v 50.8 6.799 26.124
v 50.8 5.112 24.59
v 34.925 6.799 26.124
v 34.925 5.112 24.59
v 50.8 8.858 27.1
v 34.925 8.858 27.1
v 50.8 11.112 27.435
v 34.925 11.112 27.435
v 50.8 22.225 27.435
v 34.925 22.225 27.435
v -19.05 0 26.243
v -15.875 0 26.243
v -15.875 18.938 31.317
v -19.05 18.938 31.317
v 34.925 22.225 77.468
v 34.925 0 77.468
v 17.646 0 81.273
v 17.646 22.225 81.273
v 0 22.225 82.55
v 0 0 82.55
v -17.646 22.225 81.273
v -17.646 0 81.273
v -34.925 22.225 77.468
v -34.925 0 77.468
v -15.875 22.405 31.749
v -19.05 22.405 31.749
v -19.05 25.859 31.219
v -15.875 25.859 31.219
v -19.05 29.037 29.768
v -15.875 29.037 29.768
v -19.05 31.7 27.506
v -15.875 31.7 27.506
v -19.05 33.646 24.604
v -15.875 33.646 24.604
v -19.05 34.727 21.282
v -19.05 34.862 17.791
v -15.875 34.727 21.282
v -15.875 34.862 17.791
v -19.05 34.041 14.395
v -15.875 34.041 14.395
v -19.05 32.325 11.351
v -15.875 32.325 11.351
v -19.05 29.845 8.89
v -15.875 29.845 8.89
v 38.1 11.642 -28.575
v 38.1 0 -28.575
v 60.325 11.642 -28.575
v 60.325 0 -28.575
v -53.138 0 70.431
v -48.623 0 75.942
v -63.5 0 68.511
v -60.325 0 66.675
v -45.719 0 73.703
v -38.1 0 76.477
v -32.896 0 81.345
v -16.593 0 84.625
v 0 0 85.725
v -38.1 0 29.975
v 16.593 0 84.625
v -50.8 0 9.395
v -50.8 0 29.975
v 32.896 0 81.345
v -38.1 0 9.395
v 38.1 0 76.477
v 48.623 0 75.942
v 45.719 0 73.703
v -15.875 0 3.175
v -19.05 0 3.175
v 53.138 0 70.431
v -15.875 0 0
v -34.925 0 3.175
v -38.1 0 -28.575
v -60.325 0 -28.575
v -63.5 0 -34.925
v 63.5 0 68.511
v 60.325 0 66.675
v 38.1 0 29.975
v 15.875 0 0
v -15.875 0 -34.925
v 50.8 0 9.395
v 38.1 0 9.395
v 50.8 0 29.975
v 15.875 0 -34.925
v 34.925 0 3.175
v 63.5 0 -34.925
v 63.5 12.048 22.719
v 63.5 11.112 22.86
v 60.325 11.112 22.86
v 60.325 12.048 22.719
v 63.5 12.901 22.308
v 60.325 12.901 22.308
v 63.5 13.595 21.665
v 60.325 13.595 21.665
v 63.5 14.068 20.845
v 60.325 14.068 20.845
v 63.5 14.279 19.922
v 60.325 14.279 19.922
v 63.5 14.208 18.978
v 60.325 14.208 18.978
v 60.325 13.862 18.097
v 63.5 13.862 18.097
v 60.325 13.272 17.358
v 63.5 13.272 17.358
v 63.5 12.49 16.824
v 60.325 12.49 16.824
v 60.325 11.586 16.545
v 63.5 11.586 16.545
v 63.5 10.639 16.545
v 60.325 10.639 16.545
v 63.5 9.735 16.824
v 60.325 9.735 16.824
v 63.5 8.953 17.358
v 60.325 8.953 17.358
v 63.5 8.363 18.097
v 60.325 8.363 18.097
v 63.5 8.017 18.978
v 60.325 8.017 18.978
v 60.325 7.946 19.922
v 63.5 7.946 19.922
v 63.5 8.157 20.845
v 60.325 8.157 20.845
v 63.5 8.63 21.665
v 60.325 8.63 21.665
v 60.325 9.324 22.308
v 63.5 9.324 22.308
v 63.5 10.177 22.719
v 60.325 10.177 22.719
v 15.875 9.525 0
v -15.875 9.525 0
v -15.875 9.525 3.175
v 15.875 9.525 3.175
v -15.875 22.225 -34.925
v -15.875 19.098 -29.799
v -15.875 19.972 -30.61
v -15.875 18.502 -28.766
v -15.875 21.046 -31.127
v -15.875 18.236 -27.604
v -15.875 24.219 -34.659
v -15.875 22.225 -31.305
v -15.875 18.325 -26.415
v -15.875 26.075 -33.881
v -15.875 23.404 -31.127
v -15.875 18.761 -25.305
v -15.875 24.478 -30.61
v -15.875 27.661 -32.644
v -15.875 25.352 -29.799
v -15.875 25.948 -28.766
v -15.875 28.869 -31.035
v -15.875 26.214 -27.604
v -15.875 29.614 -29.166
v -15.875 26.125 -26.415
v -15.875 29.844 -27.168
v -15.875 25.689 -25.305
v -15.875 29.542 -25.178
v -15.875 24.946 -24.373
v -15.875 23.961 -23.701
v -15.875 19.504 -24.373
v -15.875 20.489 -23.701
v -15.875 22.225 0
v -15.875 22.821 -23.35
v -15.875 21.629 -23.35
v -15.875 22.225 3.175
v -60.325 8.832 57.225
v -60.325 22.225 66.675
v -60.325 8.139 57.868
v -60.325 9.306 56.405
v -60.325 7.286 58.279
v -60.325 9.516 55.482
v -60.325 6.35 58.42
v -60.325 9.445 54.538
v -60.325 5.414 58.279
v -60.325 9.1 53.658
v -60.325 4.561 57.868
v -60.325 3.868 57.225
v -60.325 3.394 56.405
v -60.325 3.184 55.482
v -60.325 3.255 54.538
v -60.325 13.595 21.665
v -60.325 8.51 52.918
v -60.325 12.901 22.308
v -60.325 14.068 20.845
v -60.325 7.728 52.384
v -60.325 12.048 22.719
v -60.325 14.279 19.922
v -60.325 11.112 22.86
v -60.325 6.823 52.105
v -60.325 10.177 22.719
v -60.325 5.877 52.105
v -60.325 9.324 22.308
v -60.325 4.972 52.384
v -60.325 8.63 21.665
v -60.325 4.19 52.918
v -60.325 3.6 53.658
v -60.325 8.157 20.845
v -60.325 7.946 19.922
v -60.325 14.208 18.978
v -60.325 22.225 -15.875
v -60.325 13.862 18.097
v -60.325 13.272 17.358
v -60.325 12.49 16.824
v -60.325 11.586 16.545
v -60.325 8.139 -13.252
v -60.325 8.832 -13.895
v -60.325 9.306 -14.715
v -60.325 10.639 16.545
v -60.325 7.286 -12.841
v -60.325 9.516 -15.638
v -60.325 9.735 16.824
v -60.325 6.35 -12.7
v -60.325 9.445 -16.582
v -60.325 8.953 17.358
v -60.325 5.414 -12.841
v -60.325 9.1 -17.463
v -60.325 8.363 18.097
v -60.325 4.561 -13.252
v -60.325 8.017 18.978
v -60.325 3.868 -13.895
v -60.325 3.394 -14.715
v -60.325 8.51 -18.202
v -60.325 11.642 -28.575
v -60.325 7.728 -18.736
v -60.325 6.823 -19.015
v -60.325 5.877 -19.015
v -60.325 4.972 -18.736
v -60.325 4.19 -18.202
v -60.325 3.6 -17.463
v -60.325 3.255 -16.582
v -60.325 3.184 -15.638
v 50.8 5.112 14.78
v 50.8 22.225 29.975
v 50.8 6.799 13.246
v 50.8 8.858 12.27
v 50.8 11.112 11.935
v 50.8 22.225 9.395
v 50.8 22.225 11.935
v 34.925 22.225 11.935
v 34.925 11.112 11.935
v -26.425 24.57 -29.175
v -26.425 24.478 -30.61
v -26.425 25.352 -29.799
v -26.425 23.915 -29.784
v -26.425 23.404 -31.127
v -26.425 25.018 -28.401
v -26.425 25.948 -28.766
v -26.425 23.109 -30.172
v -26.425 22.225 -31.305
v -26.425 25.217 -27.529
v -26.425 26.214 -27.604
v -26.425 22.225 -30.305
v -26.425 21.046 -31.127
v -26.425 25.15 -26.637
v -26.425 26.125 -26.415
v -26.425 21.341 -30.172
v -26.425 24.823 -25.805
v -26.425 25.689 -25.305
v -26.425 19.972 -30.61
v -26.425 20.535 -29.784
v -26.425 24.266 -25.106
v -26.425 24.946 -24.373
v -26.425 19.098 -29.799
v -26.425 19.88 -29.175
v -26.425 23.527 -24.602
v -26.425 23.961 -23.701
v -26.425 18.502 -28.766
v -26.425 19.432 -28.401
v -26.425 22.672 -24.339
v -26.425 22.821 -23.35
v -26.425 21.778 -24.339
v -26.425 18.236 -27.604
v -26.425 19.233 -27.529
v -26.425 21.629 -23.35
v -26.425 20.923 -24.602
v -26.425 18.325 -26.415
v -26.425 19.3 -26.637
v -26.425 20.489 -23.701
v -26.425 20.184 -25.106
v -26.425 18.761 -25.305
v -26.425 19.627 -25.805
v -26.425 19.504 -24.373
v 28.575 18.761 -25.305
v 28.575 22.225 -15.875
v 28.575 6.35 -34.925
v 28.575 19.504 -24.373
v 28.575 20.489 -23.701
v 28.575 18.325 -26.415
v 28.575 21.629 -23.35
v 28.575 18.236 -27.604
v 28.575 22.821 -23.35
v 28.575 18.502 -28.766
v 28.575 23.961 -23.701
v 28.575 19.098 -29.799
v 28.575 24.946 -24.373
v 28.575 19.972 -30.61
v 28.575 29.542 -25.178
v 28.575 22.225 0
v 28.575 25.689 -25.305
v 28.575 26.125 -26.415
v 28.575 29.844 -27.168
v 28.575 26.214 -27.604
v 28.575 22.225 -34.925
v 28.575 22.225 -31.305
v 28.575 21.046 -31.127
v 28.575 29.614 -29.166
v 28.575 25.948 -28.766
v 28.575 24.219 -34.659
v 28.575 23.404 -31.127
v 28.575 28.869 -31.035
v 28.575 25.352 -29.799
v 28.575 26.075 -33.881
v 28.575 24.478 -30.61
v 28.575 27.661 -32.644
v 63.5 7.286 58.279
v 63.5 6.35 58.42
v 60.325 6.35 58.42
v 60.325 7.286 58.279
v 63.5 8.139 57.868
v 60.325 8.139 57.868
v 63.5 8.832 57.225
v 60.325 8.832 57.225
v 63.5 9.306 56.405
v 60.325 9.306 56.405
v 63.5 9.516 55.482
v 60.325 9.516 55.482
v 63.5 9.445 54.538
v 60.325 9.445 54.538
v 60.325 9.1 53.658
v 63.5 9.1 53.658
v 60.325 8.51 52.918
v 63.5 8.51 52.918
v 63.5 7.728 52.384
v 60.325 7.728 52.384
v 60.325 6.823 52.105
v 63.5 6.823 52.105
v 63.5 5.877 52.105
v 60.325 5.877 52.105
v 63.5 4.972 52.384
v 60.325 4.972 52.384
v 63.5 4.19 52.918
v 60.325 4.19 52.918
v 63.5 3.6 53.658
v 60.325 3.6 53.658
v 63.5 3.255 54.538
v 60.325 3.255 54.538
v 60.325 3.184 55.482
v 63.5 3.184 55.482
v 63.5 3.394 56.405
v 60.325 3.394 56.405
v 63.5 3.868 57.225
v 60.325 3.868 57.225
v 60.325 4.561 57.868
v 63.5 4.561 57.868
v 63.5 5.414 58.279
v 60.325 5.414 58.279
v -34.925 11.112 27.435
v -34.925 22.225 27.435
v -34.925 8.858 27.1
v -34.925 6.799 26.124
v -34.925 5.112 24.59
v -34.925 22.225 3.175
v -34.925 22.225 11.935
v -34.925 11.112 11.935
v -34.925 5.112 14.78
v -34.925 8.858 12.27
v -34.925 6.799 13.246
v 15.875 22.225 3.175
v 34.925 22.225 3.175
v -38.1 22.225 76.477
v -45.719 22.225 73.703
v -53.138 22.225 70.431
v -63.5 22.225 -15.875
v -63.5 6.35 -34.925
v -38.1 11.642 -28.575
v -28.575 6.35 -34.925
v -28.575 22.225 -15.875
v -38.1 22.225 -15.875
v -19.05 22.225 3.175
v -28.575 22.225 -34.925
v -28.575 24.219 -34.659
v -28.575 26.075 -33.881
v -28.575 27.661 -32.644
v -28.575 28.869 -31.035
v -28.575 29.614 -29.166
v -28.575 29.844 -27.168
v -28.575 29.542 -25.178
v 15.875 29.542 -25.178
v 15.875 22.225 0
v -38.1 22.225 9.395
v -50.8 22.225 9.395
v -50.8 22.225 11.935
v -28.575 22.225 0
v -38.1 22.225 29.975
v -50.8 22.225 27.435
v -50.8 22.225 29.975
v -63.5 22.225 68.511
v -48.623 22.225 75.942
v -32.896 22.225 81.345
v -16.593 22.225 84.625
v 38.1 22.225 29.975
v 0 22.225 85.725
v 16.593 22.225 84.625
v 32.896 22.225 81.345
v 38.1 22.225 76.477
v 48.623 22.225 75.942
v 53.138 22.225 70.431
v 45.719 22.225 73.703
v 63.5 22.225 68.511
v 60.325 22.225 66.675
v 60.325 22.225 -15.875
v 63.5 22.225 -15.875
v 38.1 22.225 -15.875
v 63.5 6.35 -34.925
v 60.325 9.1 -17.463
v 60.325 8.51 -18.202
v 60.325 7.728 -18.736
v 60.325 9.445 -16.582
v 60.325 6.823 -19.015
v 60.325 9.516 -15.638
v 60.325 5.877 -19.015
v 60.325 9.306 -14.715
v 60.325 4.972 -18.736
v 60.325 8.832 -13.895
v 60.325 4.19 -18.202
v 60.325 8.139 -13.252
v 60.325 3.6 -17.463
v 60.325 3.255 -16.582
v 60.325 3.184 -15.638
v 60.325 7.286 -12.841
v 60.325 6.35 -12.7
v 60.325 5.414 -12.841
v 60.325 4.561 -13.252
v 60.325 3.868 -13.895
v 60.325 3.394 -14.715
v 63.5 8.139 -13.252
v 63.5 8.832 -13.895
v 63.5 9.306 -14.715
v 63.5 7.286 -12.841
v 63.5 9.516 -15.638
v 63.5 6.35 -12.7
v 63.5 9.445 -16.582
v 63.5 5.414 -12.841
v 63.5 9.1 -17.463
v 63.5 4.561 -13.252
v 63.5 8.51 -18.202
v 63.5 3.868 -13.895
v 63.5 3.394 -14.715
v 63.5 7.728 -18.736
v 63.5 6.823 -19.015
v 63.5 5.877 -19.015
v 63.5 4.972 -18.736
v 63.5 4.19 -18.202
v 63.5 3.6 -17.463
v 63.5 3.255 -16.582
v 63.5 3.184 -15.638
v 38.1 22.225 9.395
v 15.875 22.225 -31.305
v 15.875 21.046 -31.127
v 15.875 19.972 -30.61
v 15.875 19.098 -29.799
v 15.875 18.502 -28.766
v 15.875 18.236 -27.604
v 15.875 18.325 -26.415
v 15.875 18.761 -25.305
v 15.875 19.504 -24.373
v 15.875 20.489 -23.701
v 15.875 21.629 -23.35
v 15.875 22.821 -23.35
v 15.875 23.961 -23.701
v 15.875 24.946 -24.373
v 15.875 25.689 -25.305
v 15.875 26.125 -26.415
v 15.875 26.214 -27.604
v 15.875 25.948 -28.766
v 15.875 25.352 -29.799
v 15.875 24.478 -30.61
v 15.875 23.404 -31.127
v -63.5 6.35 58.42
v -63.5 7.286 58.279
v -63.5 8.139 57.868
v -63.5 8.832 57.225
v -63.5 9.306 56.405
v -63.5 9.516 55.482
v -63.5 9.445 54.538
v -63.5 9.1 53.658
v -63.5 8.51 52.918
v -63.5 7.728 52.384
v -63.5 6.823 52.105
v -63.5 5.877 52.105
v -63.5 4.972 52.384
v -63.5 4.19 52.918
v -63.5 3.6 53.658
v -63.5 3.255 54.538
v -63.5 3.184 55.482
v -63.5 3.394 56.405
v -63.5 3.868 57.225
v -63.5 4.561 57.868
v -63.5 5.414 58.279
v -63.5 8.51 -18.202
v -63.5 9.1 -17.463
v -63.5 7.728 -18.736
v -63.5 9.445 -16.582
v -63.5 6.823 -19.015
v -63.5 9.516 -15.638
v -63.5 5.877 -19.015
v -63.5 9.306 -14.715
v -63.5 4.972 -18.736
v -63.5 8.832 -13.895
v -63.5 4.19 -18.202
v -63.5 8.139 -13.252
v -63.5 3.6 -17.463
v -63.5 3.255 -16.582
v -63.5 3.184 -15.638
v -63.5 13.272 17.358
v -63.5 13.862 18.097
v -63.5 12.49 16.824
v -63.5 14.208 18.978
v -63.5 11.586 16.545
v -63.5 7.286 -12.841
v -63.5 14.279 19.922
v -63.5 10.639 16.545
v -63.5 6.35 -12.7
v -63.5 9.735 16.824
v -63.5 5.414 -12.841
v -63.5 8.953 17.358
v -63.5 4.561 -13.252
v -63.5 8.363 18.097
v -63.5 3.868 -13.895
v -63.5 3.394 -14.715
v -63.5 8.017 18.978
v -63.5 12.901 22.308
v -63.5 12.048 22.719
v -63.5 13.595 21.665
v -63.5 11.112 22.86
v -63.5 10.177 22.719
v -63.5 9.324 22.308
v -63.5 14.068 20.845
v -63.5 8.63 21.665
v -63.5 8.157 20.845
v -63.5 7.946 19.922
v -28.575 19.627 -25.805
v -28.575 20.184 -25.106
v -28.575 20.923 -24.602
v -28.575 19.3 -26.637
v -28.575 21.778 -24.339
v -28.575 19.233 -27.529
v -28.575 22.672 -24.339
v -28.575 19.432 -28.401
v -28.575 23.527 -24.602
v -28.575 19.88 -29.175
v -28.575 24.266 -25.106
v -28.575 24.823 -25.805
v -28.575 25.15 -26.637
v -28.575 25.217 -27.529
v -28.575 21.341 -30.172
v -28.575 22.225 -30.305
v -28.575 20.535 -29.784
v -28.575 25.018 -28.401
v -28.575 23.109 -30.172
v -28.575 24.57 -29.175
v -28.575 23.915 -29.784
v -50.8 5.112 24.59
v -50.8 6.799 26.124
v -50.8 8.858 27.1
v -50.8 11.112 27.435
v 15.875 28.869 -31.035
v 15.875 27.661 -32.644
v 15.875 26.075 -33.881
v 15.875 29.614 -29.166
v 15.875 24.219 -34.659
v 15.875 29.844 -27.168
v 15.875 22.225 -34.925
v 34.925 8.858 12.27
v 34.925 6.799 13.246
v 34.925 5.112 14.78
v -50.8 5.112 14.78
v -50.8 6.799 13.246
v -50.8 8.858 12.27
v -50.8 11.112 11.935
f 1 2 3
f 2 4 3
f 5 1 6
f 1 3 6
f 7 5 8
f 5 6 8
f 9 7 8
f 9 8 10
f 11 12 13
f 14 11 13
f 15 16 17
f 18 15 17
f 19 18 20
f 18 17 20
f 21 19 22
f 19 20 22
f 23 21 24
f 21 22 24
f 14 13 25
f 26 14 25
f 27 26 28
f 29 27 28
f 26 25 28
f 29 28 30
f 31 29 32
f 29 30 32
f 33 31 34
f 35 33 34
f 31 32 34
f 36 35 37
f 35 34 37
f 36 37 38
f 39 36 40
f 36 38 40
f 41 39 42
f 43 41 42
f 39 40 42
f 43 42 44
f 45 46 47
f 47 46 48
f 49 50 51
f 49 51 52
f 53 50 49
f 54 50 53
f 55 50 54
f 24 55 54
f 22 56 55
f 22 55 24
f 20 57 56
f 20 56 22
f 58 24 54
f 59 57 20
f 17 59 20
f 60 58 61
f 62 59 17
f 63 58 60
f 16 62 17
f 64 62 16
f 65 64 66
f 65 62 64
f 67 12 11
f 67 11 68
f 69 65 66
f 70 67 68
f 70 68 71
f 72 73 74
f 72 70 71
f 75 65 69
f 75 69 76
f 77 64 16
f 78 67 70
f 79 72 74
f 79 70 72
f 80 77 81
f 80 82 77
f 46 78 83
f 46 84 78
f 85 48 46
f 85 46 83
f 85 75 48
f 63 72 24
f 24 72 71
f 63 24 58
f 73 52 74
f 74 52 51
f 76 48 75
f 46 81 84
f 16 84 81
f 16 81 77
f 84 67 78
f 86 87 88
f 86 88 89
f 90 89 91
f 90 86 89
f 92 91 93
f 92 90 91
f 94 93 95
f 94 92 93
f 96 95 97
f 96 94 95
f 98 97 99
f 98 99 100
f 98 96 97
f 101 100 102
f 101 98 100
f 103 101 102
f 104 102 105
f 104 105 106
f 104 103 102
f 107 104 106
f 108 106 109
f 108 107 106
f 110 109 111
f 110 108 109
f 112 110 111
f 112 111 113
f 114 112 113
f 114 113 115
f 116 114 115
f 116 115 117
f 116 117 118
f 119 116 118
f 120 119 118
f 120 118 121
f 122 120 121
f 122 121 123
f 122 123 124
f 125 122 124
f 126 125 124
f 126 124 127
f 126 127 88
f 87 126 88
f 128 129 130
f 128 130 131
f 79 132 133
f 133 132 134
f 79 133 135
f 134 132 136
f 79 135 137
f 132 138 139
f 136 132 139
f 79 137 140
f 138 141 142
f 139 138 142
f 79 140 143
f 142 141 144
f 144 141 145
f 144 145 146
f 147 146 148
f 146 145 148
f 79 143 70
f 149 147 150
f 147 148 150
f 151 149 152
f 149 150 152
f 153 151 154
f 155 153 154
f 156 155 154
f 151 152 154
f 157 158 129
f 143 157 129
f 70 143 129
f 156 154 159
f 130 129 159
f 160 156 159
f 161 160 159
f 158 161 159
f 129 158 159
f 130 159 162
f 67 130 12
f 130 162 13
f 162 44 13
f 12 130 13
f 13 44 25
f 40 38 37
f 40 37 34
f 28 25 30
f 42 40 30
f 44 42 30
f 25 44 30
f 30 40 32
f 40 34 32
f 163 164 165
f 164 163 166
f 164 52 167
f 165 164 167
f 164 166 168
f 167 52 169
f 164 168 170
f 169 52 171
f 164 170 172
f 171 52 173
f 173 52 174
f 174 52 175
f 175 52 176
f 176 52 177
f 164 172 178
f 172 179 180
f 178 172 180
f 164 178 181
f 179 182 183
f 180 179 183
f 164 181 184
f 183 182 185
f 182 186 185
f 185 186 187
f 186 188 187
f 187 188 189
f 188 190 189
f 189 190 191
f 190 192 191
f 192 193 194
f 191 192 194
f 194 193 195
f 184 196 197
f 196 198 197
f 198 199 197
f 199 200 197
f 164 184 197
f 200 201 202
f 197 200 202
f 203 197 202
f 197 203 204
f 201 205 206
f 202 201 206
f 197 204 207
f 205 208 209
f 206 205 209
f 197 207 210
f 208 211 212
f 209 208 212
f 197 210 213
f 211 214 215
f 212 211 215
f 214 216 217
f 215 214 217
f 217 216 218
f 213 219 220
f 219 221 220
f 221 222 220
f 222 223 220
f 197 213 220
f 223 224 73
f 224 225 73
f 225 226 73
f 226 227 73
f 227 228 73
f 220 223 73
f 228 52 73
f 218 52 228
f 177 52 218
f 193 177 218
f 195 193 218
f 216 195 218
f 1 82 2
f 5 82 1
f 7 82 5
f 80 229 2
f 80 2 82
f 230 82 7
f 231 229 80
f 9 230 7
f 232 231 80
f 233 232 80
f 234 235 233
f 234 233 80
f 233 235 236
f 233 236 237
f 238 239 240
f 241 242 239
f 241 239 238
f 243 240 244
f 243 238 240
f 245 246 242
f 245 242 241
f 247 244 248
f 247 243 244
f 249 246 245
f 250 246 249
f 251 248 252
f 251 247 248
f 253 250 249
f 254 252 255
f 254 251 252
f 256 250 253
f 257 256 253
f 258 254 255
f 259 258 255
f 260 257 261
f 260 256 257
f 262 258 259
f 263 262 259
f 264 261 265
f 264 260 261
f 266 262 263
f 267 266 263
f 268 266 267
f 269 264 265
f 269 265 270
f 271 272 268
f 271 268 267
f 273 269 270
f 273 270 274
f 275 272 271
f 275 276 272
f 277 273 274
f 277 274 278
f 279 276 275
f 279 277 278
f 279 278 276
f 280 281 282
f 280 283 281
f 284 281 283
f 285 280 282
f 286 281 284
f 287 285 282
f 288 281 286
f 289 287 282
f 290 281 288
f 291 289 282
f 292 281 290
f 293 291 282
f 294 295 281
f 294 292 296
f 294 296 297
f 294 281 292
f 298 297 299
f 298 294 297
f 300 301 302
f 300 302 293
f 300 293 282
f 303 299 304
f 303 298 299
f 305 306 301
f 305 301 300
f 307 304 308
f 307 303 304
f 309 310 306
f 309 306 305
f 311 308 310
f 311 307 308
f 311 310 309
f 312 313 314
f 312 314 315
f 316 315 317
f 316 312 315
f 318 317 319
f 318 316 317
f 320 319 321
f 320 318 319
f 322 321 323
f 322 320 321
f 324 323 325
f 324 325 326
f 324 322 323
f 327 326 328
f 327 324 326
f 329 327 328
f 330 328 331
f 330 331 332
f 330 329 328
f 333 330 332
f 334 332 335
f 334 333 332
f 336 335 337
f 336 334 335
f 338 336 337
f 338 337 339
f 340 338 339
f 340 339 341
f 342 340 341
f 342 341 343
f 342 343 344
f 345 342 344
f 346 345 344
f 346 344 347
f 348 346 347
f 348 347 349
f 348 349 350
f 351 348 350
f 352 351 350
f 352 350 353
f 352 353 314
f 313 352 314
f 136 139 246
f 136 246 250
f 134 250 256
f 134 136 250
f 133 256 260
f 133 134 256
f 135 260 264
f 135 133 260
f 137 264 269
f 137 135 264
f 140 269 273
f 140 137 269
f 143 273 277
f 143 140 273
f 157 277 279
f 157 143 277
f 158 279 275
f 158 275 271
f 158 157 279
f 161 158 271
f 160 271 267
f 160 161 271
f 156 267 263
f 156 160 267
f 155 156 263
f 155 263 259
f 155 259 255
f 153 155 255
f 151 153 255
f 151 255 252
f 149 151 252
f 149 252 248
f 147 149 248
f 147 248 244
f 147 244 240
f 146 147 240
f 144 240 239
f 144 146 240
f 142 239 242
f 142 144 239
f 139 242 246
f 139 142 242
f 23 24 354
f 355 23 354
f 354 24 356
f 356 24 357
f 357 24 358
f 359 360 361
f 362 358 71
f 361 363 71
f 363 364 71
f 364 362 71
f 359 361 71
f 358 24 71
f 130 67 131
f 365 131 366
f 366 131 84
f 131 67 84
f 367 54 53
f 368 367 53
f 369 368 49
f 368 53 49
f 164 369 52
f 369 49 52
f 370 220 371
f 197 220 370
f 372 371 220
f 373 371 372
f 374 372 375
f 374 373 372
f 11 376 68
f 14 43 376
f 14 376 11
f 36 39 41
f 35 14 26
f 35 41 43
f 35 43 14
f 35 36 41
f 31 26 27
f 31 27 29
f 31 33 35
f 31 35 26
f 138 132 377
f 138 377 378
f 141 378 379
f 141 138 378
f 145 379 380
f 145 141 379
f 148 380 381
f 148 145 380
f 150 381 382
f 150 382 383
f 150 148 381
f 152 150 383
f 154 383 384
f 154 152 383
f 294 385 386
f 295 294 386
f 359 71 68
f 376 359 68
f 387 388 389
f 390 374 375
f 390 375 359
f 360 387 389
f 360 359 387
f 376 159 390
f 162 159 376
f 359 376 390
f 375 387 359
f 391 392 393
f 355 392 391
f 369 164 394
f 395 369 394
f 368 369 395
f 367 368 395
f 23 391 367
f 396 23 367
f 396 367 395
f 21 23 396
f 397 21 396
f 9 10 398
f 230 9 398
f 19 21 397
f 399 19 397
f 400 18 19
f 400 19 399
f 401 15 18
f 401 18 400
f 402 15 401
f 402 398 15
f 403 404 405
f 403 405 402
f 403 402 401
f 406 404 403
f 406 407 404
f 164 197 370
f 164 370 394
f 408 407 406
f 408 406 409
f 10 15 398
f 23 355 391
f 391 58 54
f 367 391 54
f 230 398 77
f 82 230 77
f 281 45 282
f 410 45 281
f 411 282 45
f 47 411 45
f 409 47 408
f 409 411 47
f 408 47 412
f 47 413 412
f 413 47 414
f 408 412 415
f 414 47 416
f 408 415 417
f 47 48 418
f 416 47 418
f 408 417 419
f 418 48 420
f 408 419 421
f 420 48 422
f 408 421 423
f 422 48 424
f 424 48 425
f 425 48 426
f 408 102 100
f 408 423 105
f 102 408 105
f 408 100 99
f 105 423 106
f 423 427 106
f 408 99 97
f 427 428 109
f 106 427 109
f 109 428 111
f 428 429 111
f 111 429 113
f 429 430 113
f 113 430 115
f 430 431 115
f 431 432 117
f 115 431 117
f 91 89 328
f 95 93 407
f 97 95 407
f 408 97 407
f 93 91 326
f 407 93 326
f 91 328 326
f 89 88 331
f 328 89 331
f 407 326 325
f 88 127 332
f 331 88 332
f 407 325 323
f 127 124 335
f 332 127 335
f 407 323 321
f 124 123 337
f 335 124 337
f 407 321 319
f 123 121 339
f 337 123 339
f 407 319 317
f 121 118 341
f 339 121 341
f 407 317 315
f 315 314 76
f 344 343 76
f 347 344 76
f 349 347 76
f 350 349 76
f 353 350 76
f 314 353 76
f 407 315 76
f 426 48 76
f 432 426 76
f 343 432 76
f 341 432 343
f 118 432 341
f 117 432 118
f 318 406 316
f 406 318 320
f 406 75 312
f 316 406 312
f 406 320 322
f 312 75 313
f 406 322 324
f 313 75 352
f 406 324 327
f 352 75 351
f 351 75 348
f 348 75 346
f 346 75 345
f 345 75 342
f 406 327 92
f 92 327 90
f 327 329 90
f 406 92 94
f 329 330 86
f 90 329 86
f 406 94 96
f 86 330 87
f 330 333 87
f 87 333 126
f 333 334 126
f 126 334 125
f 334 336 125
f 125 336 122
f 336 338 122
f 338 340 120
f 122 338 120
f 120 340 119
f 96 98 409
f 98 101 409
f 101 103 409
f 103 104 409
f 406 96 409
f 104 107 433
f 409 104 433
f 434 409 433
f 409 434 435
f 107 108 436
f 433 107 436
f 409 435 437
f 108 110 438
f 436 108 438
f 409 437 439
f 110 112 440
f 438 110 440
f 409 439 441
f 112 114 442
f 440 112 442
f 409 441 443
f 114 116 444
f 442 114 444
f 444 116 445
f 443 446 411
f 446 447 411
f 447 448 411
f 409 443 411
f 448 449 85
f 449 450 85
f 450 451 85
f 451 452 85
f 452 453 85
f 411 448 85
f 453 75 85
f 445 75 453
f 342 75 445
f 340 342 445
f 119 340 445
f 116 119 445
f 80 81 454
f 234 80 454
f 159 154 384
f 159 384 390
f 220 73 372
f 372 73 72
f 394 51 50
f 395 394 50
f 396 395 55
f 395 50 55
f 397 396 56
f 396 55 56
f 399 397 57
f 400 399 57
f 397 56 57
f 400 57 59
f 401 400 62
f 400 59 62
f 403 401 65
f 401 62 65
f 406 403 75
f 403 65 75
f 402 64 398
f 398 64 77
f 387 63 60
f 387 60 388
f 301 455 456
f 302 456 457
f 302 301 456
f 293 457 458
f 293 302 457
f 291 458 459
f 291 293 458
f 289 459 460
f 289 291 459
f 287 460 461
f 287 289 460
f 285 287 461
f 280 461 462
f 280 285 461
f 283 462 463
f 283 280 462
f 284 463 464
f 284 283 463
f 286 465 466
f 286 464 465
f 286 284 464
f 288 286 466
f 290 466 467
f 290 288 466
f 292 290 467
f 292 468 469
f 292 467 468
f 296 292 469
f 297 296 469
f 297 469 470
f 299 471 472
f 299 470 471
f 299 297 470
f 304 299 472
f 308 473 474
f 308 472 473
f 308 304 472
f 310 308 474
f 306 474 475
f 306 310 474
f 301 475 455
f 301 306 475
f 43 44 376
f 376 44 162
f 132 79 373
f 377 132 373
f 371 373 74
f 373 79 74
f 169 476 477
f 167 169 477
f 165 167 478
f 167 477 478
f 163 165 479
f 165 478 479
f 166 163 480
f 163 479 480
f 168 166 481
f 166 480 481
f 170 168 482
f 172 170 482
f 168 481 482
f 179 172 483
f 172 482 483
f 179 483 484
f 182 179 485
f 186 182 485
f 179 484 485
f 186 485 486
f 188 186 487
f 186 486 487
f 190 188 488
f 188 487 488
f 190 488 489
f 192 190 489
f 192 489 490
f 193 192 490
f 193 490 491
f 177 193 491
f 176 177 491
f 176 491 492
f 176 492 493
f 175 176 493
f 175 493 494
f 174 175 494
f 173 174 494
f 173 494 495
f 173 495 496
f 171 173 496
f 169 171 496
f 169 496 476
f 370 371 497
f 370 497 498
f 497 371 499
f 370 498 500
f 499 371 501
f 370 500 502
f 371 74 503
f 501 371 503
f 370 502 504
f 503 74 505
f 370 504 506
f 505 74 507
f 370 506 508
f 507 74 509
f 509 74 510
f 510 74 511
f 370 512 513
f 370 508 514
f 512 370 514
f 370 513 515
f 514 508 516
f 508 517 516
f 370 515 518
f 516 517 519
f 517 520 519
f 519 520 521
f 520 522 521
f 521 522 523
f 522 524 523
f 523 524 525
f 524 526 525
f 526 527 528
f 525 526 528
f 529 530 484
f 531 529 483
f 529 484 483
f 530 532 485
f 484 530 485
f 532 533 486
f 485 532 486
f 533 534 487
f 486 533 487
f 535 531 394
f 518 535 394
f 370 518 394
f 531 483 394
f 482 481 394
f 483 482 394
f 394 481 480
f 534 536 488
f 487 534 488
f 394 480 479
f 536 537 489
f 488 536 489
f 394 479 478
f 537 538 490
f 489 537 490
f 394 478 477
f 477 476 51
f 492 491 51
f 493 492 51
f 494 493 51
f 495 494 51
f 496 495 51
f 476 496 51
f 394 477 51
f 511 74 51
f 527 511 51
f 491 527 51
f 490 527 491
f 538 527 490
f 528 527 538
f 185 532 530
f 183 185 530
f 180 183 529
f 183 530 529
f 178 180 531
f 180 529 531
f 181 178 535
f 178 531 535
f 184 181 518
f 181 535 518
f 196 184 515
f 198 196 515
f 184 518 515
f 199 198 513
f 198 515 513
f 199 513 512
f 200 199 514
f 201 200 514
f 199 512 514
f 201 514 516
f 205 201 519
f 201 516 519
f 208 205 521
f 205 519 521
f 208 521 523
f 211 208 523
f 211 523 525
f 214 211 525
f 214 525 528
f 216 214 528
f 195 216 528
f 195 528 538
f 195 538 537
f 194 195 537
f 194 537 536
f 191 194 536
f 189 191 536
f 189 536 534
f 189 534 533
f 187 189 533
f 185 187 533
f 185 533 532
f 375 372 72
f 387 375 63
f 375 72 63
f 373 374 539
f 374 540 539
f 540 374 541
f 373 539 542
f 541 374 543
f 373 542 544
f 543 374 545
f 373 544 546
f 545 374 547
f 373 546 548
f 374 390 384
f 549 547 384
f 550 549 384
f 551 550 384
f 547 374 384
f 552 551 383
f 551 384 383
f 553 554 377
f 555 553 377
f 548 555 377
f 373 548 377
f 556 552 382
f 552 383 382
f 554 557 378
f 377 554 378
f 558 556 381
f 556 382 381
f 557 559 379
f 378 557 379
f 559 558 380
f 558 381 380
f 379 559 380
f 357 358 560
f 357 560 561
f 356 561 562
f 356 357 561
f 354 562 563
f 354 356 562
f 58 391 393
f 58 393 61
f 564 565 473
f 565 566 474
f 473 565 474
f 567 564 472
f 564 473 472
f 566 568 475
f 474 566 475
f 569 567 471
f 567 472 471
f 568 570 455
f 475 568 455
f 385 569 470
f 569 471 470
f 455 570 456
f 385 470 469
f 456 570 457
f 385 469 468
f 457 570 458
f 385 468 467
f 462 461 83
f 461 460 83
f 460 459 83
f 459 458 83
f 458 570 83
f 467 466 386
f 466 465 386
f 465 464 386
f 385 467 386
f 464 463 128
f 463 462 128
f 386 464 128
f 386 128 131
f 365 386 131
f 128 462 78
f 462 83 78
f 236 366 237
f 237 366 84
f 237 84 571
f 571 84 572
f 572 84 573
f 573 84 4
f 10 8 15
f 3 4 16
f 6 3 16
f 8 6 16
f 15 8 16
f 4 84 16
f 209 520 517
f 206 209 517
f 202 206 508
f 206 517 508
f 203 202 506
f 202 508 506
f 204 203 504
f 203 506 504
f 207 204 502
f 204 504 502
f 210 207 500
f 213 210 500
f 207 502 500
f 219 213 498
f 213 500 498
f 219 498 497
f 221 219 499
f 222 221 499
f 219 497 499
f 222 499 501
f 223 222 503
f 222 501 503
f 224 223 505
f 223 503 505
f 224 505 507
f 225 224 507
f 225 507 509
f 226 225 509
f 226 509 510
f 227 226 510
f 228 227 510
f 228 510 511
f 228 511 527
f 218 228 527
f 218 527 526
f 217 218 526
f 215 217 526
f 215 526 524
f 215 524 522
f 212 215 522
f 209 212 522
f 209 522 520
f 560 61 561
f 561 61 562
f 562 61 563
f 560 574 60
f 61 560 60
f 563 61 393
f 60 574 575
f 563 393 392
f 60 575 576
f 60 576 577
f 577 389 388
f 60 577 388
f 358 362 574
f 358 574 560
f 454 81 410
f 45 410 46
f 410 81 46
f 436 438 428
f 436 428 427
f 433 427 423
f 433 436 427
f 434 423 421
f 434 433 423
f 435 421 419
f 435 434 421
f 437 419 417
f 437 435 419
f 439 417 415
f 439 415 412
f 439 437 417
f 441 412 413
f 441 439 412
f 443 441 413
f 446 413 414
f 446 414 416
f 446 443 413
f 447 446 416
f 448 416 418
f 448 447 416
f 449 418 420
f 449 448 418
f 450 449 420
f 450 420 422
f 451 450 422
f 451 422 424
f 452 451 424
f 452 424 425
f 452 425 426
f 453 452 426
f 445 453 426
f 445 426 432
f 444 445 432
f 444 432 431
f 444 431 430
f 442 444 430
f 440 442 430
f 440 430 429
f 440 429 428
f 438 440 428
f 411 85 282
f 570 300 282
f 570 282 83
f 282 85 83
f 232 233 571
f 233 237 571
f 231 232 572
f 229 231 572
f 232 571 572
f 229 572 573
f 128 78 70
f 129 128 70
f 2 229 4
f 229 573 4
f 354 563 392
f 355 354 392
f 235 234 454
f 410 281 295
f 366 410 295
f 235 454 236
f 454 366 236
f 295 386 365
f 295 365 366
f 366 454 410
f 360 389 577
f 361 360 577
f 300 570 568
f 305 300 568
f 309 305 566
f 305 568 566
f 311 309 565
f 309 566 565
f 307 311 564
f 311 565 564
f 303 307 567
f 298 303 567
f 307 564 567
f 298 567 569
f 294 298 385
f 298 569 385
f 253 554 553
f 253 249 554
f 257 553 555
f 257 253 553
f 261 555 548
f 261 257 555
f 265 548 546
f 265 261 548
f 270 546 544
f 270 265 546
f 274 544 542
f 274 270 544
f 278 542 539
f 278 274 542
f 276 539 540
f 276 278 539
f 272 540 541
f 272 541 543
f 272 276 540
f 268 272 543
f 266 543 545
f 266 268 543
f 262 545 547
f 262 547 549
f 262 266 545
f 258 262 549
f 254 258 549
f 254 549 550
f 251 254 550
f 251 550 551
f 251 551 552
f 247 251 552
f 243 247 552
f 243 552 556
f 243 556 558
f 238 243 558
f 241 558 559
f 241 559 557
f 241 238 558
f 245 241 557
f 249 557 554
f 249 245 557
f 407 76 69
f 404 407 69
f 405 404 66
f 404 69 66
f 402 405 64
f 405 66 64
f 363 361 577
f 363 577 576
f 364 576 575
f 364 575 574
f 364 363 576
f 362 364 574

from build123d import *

# Parameters (mm, degrees)
BOSS_EXTRUDE1_DEPTH     = 22.225
CUT_EXTRUDE3_DEPTH      = 155.828053821
CUT_EXTRUDE3_DEPTH_BACK = 155.828053821
BOSS_EXTRUDE3_DEPTH     = 12.7
SKETCH10_W              = 31.75
SKETCH10_H              = 3.175
CUT_EXTRUDE5_DEPTH      = 12.7
CUT_EXTRUDE4_REACH      = 158.104
SKETCH9_R               = 3.175
BOSS_EXTRUDE6_DEPTH     = 3.175
CUT_EXTRUDE8_REACH      = 139.445
BOSS_EXTRUDE7_DEPTH     = 12.7


with BuildPart() as part:
    # Sketch1 → Boss-Extrude1 (new body)
    with BuildSketch(Plane(origin=(0, 0, 0), x_dir=(1, 0, 0), z_dir=(0, 1, 0))):
        with BuildLine():
            Line((-15.875, 0), (-15.875, 34.925))
            Line((-15.875, 34.925), (-63.5, 34.925))
            Line((-63.5, 34.925), (-63.5, -68.511279424))
            ThreePointArc((-63.5, -68.511279424), (0, -85.725), (63.5, -68.511279424))
            Line((63.5, -68.511279424), (63.5, 34.925))
            Line((63.5, 34.925), (15.875, 34.925))
            Line((15.875, 34.925), (15.875, 0))
            Line((15.875, 0), (-15.875, 0))
        make_face()
        with BuildLine():
            ThreePointArc((34.925, -77.468283771), (0, -82.55), (-34.925, -77.468283771))
            Line((-34.925, -77.468283771), (-34.925, -3.175))
            Line((-34.925, -3.175), (34.925, -3.175))
            Line((34.925, -3.175), (34.925, -77.468283771))
        make_face(mode=Mode.SUBTRACT)
        with BuildLine():
            Line((-38.1, 0), (-38.1, -76.477264852))
            ThreePointArc((-38.1, -76.477264852), (-49.455952678, -72.128120752), (-60.325, -66.675))
            Line((-60.325, -66.675), (-60.325, 28.575))
            Line((-60.325, 28.575), (-38.1, 28.575))
            Line((-38.1, 28.575), (-38.1, 0))
        make_face(mode=Mode.SUBTRACT)
        with BuildLine():
            ThreePointArc((60.325, -66.675), (49.455952678, -72.128120752), (38.1, -76.477264852))
            Line((38.1, -76.477264852), (38.1, 0))
            Line((38.1, 0), (38.1, 28.575))
            Line((38.1, 28.575), (60.325, 28.575))
            Line((60.325, 28.575), (60.325, -66.675))
        make_face(mode=Mode.SUBTRACT)
    extrude(amount=BOSS_EXTRUDE1_DEPTH)

    # Sketch3 → Cut-Extrude3 (cut, two sides: drawn at the far end of the back side and taken through both)
    with BuildSketch(Plane.ZY.offset(63.5).offset(-CUT_EXTRUDE3_DEPTH_BACK)):
        Polygon((-229.576794349, -155.859828624), (-34.925, 6.35), (-15.875, 22.225), (178.776794349, 184.434828624), (-145.6428629, 573.738417323), (-553.996451598, 233.443760074), align=None)
    extrude(amount=CUT_EXTRUDE3_DEPTH + CUT_EXTRUDE3_DEPTH_BACK, mode=Mode.SUBTRACT)

    # Sketch7 → Boss-Extrude3 (add)
    with BuildSketch(Plane(origin=(-15.875, 0, 0), x_dir=(0, 0, -1), z_dir=(1, 0, 0))):
        with BuildLine():
            Line((34.925, 0), (34.925, 22.225))
            ThreePointArc((34.925, 22.225), (31.879952535, 28.318784481), (25.178488372, 29.542263716))
            Line((25.178488372, 29.542263716), (0, 22.225))
            Line((0, 22.225), (0, 0))
            Line((0, 0), (34.925, 0))
        make_face()
    boss_extrude3 = extrude(amount=-BOSS_EXTRUDE3_DEPTH)

    # Mirror1: Boss-Extrude3 across plane
    add(boss_extrude3.mirror(Plane(origin=(0, 0, 0), x_dir=(0, 0, 1), z_dir=(1, 0, 0))))

    # Sketch10 → Cut-Extrude5 (cut)
    with BuildSketch(Plane(origin=(0, 22.225, 0), x_dir=(1, 0, 0), z_dir=(0, 1, 0))):
        with Locations((0, -1.5875)):
            Rectangle(SKETCH10_W, SKETCH10_H)
    extrude(amount=-CUT_EXTRUDE5_DEPTH, mode=Mode.SUBTRACT)

    # Sketch8 → Cut-Revolve1 (revolve, cut)
    with BuildSketch(Plane(origin=(0, 26.545081967, -22.120901639), x_dir=(1, 0, 0), z_dir=(0, 0.7682212795973757, -0.6401843996644799))):
        Polygon((28.575, 6.748183757), (-28.575, 6.748183757), (-28.575, 9.748183757), (-26.425, 9.748183757), (-26.425, 10.748183757), (28.575, 10.748183757), align=None)
    revolve(axis=Axis((28.575, 22.225, -27.305), (-1, 0, 0)), mode=Mode.SUBTRACT)

    # Sketch9 → Cut-Extrude4 (cut, up to next)
    with BuildSketch(Plane.ZY.offset(63.5), mode=Mode.PRIVATE) as cut_extrude4_sk1:
        with Locations((-15.875, 6.35)):
            Circle(SKETCH9_R)
    cut_extrude4_tool1 = extrude(cut_extrude4_sk1.sketch, amount=-CUT_EXTRUDE4_REACH, mode=Mode.PRIVATE) & part.part
    # Sketch9 → Cut-Extrude4 (cut, up to next)
    with BuildSketch(Plane.ZY.offset(63.5), mode=Mode.PRIVATE) as cut_extrude4_sk2:
        with Locations((55.245, 6.35)):
            Circle(SKETCH9_R)
    cut_extrude4_tool2 = extrude(cut_extrude4_sk2.sketch, amount=-CUT_EXTRUDE4_REACH, mode=Mode.PRIVATE) & part.part
    # Sketch9 → Cut-Extrude4 (cut, up to next)
    with BuildSketch(Plane.ZY.offset(63.5), mode=Mode.PRIVATE) as cut_extrude4_sk3:
        with Locations((19.685, 11.1125)):
            Circle(SKETCH9_R)
    cut_extrude4_tool3 = extrude(cut_extrude4_sk3.sketch, amount=-CUT_EXTRUDE4_REACH, mode=Mode.PRIVATE) & part.part
    cut_extrude4_1 = cut_extrude4_tool1.solids().sort_by_distance((-63.5, 6.35, -15.875))[0]
    add(cut_extrude4_1, mode=Mode.SUBTRACT)
    cut_extrude4_2 = cut_extrude4_tool2.solids().sort_by_distance((-63.5, 6.35, 55.245))[0]
    add(cut_extrude4_2, mode=Mode.SUBTRACT)
    cut_extrude4_3 = cut_extrude4_tool3.solids().sort_by_distance((-63.5, 11.1125, 19.685))[0]
    add(cut_extrude4_3, mode=Mode.SUBTRACT)
    cut_extrude4 = cut_extrude4_1 + cut_extrude4_2 + cut_extrude4_3  # Cut-Extrude4 as one shape, for the pattern or mirror that repeats it

    # Mirror10: Cut-Extrude4 across plane
    add(cut_extrude4.mirror(Plane(origin=(0, 0, 0), x_dir=(0, 0, 1), z_dir=(1, 0, 0))), mode=Mode.SUBTRACT)

    # Sketch16 → Boss-Extrude6 (add)
    with BuildSketch(Plane(origin=(-15.875, 0, 0), x_dir=(0, 0, -1), z_dir=(1, 0, 0))):
        with BuildLine():
            Line((-8.89, 29.845), (-3.175, 22.225))
            Line((-3.175, 22.225), (0, 22.225))
            Line((0, 22.225), (0, 0))
            Line((0, 0), (-3.175, 0))
            Line((-3.175, 0), (-26.242836689, 0))
            Line((-26.242836689, 0), (-31.317257994, 18.937998127))
            ThreePointArc((-31.317257994, 18.937998127), (-24.604350234, 33.645997919), (-8.89, 29.845))
        make_face()
    extrude(amount=-BOSS_EXTRUDE6_DEPTH)

    # Sketch17 → Cut-Extrude8 (cut, up to next)
    with BuildSketch(Plane.ZY.offset(38.1), mode=Mode.PRIVATE) as cut_extrude8_sk1:
        with BuildLine():
            Line((24.590354218, 5.1125), (14.779645782, 5.1125))
            ThreePointArc((14.779645782, 5.1125), (12.682179312, 7.792409277), (11.935, 11.1125))
            Line((11.935, 11.1125), (11.935, 22.225))
            Line((11.935, 22.225), (27.435, 22.225))
            Line((27.435, 22.225), (27.435, 11.1125))
            ThreePointArc((27.435, 11.1125), (26.687820688, 7.792409277), (24.590354218, 5.1125))
        make_face()
    cut_extrude8_tool1 = extrude(cut_extrude8_sk1.sketch, amount=-CUT_EXTRUDE8_REACH, mode=Mode.PRIVATE) & part.part
    cut_extrude8 = cut_extrude8_tool1.solids().sort_by_distance((-38.1, 13.958781, 19.685))[0]
    add(cut_extrude8, mode=Mode.SUBTRACT)

    # Mirror11: Cut-Extrude8 across plane
    add(cut_extrude8.mirror(Plane(origin=(0, 0, 0), x_dir=(0, 0, 1), z_dir=(1, 0, 0))), mode=Mode.SUBTRACT)

    # Sketch18 → Boss-Extrude7 (add)
    with BuildSketch(Plane(origin=(38.1, 0, 0), x_dir=(0, 0, -1), z_dir=(1, 0, 0))):
        with BuildLine():
            Line((-11.935, 22.225), (-11.935, 11.1125))
            ThreePointArc((-11.935, 11.1125), (-12.682179312, 7.792409277), (-14.779645782, 5.1125))
            Line((-14.779645782, 5.1125), (-24.590354218, 5.1125))
            ThreePointArc((-24.590354218, 5.1125), (-26.687820688, 7.792409277), (-27.435, 11.1125))
            Line((-27.435, 11.1125), (-27.435, 22.225))
            Line((-27.435, 22.225), (-29.975, 22.225))
            Line((-29.975, 22.225), (-29.975, 0))
            Line((-29.975, 0), (-9.395, 0))
            Line((-9.395, 0), (-9.395, 22.225))
            Line((-9.395, 22.225), (-11.935, 22.225))
        make_face()
    boss_extrude7 = extrude(amount=BOSS_EXTRUDE7_DEPTH)

    # Mirror12: Boss-Extrude7 across plane
    add(boss_extrude7.mirror(Plane(origin=(0, 0, 0), x_dir=(0, 0, 1), z_dir=(1, 0, 0))))


solid = part.part
